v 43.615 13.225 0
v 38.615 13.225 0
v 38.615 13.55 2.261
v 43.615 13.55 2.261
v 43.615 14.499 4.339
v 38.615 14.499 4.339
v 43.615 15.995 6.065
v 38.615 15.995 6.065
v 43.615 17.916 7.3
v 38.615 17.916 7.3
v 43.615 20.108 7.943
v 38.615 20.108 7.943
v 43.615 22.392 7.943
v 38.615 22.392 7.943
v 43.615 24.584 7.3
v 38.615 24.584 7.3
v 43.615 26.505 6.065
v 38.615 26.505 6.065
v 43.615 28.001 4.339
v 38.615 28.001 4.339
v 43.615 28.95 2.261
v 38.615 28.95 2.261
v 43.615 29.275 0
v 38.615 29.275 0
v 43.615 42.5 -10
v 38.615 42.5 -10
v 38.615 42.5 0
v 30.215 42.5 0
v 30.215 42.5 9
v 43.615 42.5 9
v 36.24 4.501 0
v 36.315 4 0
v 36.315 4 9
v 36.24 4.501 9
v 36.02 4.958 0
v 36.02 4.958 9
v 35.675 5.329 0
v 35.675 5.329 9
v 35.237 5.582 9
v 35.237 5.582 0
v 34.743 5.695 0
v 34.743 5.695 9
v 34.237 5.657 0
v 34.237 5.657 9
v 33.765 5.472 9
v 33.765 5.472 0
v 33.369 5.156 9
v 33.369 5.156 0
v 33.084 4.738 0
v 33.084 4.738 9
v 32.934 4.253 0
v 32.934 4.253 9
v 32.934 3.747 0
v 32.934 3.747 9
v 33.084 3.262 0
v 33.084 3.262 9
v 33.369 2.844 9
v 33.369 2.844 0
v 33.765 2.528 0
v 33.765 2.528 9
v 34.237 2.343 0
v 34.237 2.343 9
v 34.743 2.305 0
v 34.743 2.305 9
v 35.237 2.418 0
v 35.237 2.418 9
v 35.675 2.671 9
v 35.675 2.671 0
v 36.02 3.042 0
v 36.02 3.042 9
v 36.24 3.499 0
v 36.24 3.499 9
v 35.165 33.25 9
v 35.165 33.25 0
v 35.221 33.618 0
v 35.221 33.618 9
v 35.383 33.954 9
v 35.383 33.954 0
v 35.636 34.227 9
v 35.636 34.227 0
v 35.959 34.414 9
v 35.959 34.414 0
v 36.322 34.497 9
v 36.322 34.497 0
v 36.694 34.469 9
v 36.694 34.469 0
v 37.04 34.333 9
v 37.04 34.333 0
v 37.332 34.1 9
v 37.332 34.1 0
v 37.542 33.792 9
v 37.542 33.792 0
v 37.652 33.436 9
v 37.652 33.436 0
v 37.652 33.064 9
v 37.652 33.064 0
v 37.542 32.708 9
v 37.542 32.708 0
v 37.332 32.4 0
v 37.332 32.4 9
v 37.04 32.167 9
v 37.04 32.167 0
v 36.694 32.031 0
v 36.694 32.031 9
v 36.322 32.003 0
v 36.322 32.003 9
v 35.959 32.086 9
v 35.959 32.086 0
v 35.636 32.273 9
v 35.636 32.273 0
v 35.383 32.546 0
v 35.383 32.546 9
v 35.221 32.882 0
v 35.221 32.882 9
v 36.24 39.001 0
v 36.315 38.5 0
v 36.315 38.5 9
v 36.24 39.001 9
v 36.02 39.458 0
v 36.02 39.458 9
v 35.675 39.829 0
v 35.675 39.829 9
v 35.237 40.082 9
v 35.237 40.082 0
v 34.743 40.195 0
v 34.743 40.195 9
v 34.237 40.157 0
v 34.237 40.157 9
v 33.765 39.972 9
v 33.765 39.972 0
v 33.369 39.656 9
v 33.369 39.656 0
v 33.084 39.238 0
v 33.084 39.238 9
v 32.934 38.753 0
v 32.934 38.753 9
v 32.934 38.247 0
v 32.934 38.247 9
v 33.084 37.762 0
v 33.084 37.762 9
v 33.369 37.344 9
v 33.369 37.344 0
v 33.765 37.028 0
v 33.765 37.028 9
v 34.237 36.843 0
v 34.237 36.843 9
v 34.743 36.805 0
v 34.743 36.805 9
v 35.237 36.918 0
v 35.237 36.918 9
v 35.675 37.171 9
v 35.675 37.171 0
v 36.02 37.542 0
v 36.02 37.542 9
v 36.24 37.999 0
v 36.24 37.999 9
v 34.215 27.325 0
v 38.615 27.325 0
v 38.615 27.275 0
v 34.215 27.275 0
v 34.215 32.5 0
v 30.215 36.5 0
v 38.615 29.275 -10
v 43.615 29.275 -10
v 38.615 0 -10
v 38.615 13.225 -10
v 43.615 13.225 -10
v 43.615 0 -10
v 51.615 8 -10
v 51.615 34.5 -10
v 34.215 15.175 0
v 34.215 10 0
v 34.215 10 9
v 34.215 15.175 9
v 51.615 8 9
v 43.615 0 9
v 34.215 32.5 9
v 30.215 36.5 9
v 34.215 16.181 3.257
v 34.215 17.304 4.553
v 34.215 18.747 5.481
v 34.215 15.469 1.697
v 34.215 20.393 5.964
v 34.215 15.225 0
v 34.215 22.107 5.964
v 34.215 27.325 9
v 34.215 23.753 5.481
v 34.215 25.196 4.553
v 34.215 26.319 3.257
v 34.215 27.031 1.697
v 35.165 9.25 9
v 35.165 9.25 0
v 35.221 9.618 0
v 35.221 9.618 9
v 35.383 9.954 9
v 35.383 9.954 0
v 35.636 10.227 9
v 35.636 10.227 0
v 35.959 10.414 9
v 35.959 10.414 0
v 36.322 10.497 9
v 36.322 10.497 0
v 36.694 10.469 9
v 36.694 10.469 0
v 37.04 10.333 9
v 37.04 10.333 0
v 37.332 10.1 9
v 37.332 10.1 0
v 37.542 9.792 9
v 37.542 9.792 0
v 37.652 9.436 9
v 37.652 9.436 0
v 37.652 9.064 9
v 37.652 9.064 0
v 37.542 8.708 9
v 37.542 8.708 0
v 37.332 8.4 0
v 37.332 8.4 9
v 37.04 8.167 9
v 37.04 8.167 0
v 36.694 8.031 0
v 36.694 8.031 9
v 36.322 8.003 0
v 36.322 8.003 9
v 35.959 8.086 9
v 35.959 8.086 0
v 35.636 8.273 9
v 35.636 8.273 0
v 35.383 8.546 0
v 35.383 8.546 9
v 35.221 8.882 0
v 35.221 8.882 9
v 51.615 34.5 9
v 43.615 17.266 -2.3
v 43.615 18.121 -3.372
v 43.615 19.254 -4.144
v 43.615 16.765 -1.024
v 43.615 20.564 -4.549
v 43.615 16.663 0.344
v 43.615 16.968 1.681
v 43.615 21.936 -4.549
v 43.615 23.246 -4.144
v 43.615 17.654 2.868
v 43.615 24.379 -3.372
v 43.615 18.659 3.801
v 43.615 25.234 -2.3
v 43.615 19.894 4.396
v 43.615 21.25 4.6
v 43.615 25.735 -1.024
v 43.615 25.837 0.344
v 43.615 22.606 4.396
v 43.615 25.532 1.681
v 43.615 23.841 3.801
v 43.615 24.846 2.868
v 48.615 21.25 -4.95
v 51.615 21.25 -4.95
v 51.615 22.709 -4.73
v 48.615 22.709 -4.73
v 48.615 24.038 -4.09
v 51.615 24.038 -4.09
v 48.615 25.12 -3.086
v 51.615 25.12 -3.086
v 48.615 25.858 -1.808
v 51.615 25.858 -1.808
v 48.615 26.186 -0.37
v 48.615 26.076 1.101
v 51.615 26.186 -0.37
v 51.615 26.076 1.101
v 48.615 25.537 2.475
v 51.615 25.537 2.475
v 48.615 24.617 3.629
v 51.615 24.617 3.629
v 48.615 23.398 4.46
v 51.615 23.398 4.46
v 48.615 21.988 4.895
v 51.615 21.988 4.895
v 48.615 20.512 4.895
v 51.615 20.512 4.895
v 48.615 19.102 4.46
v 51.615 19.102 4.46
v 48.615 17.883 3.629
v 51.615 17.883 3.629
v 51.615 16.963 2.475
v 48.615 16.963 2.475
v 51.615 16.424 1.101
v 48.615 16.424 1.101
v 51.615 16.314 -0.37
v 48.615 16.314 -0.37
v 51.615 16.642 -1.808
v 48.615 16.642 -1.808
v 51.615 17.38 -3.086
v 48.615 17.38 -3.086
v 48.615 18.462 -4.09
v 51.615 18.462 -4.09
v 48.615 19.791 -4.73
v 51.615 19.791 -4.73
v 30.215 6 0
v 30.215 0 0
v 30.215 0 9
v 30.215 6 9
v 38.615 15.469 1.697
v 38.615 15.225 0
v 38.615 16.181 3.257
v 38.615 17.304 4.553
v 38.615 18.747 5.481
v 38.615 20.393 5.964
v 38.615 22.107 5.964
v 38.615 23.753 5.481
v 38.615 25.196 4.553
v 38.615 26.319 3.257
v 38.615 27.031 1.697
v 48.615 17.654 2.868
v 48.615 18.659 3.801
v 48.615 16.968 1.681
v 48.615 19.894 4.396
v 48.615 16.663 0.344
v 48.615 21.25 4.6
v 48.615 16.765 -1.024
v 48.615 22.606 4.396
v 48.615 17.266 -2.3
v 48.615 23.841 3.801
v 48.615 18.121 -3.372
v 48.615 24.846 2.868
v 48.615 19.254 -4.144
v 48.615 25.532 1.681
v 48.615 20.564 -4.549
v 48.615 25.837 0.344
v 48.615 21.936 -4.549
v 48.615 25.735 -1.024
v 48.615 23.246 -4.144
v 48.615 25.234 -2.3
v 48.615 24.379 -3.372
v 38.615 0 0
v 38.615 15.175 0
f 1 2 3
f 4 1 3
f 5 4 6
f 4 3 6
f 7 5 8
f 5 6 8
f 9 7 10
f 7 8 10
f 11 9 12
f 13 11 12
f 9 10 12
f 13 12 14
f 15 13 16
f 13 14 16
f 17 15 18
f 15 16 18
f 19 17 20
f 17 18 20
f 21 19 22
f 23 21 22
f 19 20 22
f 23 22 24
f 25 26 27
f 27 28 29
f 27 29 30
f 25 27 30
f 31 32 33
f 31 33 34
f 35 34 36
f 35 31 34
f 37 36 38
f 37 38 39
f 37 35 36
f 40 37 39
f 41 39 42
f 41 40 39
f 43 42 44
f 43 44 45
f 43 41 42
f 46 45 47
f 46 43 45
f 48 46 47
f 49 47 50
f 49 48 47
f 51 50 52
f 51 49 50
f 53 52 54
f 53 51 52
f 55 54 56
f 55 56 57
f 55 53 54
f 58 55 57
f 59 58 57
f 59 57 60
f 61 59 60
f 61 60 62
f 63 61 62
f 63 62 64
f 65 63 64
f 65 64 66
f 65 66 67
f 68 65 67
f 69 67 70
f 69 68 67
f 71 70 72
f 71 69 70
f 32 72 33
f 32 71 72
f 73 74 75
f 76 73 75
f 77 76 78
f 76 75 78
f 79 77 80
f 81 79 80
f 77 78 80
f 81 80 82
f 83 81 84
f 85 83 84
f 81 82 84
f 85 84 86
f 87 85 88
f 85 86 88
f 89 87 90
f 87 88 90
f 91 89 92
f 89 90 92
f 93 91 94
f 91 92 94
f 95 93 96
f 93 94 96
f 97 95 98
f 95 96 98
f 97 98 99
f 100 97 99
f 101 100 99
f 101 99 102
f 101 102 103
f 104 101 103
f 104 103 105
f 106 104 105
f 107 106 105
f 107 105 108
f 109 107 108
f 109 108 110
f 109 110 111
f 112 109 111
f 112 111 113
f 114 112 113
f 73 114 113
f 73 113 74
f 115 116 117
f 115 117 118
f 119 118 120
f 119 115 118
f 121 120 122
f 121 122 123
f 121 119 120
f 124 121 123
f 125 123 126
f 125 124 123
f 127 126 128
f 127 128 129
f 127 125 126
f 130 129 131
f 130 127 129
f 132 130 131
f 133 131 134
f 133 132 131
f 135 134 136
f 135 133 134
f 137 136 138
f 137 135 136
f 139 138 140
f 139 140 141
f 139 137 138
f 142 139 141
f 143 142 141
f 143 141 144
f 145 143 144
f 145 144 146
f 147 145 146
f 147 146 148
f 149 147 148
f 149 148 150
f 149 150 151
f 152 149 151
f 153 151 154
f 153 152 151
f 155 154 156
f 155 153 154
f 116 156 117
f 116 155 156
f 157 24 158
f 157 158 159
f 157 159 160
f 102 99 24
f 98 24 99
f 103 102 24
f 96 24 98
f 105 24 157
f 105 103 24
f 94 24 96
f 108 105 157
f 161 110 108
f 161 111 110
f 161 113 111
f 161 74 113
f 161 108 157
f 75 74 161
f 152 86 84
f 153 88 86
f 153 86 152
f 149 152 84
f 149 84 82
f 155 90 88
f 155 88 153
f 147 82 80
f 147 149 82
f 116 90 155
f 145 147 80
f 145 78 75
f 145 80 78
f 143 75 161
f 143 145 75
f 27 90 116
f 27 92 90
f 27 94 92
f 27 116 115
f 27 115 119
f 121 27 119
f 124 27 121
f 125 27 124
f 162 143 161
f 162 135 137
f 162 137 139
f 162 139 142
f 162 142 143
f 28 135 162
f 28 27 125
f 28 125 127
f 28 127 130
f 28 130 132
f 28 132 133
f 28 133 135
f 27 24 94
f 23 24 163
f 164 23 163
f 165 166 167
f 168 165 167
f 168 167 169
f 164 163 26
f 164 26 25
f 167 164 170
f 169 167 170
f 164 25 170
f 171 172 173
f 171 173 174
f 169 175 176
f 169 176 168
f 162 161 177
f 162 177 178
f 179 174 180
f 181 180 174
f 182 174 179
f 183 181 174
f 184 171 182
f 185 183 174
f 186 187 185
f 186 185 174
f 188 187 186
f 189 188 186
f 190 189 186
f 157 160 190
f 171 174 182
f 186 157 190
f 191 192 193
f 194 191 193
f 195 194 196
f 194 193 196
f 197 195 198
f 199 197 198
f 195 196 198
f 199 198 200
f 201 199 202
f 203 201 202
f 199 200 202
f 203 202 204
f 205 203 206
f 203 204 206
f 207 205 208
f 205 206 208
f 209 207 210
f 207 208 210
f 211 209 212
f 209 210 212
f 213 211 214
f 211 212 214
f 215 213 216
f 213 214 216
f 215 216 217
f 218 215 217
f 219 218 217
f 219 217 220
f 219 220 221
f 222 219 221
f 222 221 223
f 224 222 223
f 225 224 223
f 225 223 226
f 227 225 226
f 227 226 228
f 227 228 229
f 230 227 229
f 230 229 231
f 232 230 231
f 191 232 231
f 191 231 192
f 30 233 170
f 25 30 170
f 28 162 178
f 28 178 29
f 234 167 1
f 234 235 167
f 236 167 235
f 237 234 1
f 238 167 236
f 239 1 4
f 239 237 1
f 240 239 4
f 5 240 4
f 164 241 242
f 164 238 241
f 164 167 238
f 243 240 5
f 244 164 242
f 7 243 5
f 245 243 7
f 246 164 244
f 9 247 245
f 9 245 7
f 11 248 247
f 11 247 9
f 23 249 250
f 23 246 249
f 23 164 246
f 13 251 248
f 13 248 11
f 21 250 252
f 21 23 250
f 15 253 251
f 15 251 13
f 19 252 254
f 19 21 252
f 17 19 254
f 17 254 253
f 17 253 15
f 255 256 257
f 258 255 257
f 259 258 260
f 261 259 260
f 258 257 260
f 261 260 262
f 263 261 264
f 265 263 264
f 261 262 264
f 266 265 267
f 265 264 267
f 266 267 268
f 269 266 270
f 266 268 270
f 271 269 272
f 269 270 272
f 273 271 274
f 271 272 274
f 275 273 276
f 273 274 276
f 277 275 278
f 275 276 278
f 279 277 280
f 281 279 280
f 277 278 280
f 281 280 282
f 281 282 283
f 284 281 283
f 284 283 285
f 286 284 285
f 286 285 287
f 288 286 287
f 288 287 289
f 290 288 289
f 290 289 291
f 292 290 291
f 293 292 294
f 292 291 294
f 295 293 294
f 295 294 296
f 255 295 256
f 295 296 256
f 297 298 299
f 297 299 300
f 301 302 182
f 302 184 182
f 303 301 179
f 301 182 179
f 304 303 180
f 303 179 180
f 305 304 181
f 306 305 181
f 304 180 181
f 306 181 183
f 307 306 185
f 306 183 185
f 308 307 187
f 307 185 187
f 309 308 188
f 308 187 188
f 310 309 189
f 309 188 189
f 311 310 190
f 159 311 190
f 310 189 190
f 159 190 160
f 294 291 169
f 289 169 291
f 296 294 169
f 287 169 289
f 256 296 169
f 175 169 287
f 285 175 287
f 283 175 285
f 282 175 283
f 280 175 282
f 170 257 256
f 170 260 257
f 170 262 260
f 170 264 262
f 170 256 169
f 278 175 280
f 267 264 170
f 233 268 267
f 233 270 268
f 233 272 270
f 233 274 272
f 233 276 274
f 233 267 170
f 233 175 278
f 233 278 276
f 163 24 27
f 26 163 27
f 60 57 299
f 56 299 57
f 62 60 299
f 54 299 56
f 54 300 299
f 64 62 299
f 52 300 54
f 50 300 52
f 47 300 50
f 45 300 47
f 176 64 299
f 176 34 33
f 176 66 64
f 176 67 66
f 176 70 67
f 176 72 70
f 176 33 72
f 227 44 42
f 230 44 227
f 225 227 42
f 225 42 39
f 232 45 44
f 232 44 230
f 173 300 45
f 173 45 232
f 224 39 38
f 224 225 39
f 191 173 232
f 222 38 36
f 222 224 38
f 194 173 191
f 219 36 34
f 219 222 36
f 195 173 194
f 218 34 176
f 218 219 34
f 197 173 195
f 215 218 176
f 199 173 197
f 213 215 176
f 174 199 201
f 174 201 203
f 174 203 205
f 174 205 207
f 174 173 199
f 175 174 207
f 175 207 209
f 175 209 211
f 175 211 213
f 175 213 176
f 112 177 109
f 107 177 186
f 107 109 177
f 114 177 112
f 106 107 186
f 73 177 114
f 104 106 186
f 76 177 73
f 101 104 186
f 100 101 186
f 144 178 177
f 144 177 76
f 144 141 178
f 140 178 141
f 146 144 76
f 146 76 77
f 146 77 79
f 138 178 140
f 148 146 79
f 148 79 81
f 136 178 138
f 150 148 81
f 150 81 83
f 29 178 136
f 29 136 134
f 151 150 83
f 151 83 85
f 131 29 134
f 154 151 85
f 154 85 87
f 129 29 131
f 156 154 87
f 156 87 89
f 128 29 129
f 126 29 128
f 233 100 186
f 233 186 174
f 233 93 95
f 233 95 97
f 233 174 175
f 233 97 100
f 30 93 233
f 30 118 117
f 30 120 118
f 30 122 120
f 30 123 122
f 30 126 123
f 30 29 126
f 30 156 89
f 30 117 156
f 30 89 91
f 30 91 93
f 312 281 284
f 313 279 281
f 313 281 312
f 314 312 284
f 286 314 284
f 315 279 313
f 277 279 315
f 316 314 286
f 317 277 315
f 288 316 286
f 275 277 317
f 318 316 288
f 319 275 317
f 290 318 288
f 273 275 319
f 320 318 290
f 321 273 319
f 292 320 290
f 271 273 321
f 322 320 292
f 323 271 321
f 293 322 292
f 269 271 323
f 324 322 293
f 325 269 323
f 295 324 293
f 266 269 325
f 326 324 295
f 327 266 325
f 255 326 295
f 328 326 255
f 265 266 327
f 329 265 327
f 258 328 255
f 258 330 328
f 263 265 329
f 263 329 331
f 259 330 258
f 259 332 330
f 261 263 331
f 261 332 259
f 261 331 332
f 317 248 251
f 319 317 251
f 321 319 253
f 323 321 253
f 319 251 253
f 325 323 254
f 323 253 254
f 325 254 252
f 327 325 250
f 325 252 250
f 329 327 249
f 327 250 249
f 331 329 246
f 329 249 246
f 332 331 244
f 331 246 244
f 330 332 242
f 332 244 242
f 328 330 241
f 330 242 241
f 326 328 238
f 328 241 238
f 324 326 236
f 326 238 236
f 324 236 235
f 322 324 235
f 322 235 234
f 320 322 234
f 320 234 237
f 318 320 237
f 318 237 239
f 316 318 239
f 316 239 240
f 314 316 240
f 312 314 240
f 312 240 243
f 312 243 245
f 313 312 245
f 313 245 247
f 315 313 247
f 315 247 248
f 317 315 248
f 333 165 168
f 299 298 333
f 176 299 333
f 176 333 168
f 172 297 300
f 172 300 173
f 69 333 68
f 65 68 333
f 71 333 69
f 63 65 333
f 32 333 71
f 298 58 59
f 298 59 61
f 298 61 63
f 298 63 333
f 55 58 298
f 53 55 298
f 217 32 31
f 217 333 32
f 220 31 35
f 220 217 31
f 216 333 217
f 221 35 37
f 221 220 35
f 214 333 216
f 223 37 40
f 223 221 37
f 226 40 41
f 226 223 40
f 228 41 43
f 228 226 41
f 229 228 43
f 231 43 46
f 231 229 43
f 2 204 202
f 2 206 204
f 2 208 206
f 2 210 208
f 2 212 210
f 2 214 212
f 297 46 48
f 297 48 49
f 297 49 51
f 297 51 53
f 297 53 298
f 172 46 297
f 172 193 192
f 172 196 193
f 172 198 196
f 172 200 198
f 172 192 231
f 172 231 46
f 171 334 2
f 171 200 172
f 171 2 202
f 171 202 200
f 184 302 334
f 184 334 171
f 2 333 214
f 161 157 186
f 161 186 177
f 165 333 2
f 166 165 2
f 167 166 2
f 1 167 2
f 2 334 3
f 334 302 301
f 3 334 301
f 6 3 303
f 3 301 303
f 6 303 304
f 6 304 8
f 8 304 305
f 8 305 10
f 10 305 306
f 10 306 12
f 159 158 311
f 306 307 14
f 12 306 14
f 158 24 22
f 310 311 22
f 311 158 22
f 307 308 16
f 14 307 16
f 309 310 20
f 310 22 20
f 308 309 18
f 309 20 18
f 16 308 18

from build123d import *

# Parameters (mm, degrees)
ESQUISSE1_R                               = 1.7
BOSS_EXTRU_1_DEPTH                        = 9
ESQUISSE2_W                               = 13.000000001
ESQUISSE2_H                               = 42.5
BOSS_EXTRU_2_DEPTH                        = 19
ESQUISSE4_R                               = 6.025
ENL_V_MAT_EXTRU_1_DEPTH                   = 4.4
ENL_V_MAT_EXTRU_2_DEPTH                   = 5
ESQUISSE6_R                               = 4.6
ENL_V_MAT_EXTRU_3_DEPTH                   = 9
CHANFREIN1_SIZE                           = 8
TROU_POUR_TARAUDAGE_POUR_TROU_TARAUD_M3_D = 2.5
ESQUISSE9_R                               = 4.95
ENL_V_MAT_EXTRU_4_DEPTH                   = 3


with BuildPart() as part:
    # Esquisse1 → Boss.-Extru.1 (new body)
    with BuildSketch(Plane.XY):
        Polygon((38.615489841, 27.325), (38.615489841, 15.175), (38.61548984, 0), (30.21548984, 0), (30.21548984, 6), (34.21548984, 10), (34.215489841, 15.175), (34.215489841, 27.325), (34.21548984, 32.5), (30.21548984, 36.5), (30.21548984, 42.5), (38.61548984, 42.5), align=None)
        with Locations((34.61548984, 4)):
            Circle(ESQUISSE1_R, mode=Mode.SUBTRACT)
        with Locations((34.61548984, 38.5)):
            Circle(ESQUISSE1_R, mode=Mode.SUBTRACT)
    extrude(amount=BOSS_EXTRU_1_DEPTH)

    # Esquisse2 → Boss.-Extru.2 (add)
    with BuildSketch(Plane.XY.offset(9)):
        with Locations((45.115489841, 21.25)):
            Rectangle(ESQUISSE2_W, ESQUISSE2_H)
    extrude(amount=-BOSS_EXTRU_2_DEPTH)

    # Esquisse4 → Enlèv. mat.-Extru.1 (cut)
    with BuildSketch(Plane.ZY.offset(-34.215489841)):
        with Locations((0, 21.25)):
            Circle(ESQUISSE4_R)
    extrude(amount=-ENL_V_MAT_EXTRU_1_DEPTH, mode=Mode.SUBTRACT)

    # Esquisse5 → Enlèv. mat.-Extru.2 (cut)
    with BuildSketch(Plane.ZY.offset(-38.61548984)):
        with BuildLine():
            Line((0, 29.275), (-10, 29.275))
            Line((-10, 29.275), (-10, 13.225))
            Line((-10, 13.225), (0, 13.225))
            ThreePointArc((0, 13.225), (8.025, 21.25), (0, 29.275))
        make_face()
    extrude(amount=-ENL_V_MAT_EXTRU_2_DEPTH, mode=Mode.SUBTRACT)

    # Esquisse6 → Enlèv. mat.-Extru.3 (cut, through all)
    with BuildSketch(Plane.ZY.offset(-43.61548984)):
        with Locations((0, 21.25)):
            Circle(ESQUISSE6_R)
    extrude(amount=-ENL_V_MAT_EXTRU_3_DEPTH, mode=Mode.SUBTRACT)

    # Chanfrein1
    chanfrein1_edges = [part.edges().sort_by_distance(p)[0] for p in [
        (51.615489841, 0, -0.5),
        (51.615489841, 42.5, -0.5),
    ]]
    chamfer(chanfrein1_edges, length=CHANFREIN1_SIZE)

    # Trou pour taraudage pour trou taraudé M31 (through all)
    with Locations(Plane.XY.offset(9)):
        with Locations((36.41548984, 33.25), (36.41548984, 9.25)):
            Hole(TROU_POUR_TARAUDAGE_POUR_TROU_TARAUD_M3_D / 2)

    # Esquisse9 → Enlèv. mat.-Extru.4 (cut)
    with BuildSketch(Plane(origin=(51.615489841, 0, 0), x_dir=(0, 0, -1), z_dir=(1, 0, 0))):
        with Locations((0, 21.25)):
            Circle(ESQUISSE9_R)
    extrude(amount=-ENL_V_MAT_EXTRU_4_DEPTH, mode=Mode.SUBTRACT)


solid = part.part
